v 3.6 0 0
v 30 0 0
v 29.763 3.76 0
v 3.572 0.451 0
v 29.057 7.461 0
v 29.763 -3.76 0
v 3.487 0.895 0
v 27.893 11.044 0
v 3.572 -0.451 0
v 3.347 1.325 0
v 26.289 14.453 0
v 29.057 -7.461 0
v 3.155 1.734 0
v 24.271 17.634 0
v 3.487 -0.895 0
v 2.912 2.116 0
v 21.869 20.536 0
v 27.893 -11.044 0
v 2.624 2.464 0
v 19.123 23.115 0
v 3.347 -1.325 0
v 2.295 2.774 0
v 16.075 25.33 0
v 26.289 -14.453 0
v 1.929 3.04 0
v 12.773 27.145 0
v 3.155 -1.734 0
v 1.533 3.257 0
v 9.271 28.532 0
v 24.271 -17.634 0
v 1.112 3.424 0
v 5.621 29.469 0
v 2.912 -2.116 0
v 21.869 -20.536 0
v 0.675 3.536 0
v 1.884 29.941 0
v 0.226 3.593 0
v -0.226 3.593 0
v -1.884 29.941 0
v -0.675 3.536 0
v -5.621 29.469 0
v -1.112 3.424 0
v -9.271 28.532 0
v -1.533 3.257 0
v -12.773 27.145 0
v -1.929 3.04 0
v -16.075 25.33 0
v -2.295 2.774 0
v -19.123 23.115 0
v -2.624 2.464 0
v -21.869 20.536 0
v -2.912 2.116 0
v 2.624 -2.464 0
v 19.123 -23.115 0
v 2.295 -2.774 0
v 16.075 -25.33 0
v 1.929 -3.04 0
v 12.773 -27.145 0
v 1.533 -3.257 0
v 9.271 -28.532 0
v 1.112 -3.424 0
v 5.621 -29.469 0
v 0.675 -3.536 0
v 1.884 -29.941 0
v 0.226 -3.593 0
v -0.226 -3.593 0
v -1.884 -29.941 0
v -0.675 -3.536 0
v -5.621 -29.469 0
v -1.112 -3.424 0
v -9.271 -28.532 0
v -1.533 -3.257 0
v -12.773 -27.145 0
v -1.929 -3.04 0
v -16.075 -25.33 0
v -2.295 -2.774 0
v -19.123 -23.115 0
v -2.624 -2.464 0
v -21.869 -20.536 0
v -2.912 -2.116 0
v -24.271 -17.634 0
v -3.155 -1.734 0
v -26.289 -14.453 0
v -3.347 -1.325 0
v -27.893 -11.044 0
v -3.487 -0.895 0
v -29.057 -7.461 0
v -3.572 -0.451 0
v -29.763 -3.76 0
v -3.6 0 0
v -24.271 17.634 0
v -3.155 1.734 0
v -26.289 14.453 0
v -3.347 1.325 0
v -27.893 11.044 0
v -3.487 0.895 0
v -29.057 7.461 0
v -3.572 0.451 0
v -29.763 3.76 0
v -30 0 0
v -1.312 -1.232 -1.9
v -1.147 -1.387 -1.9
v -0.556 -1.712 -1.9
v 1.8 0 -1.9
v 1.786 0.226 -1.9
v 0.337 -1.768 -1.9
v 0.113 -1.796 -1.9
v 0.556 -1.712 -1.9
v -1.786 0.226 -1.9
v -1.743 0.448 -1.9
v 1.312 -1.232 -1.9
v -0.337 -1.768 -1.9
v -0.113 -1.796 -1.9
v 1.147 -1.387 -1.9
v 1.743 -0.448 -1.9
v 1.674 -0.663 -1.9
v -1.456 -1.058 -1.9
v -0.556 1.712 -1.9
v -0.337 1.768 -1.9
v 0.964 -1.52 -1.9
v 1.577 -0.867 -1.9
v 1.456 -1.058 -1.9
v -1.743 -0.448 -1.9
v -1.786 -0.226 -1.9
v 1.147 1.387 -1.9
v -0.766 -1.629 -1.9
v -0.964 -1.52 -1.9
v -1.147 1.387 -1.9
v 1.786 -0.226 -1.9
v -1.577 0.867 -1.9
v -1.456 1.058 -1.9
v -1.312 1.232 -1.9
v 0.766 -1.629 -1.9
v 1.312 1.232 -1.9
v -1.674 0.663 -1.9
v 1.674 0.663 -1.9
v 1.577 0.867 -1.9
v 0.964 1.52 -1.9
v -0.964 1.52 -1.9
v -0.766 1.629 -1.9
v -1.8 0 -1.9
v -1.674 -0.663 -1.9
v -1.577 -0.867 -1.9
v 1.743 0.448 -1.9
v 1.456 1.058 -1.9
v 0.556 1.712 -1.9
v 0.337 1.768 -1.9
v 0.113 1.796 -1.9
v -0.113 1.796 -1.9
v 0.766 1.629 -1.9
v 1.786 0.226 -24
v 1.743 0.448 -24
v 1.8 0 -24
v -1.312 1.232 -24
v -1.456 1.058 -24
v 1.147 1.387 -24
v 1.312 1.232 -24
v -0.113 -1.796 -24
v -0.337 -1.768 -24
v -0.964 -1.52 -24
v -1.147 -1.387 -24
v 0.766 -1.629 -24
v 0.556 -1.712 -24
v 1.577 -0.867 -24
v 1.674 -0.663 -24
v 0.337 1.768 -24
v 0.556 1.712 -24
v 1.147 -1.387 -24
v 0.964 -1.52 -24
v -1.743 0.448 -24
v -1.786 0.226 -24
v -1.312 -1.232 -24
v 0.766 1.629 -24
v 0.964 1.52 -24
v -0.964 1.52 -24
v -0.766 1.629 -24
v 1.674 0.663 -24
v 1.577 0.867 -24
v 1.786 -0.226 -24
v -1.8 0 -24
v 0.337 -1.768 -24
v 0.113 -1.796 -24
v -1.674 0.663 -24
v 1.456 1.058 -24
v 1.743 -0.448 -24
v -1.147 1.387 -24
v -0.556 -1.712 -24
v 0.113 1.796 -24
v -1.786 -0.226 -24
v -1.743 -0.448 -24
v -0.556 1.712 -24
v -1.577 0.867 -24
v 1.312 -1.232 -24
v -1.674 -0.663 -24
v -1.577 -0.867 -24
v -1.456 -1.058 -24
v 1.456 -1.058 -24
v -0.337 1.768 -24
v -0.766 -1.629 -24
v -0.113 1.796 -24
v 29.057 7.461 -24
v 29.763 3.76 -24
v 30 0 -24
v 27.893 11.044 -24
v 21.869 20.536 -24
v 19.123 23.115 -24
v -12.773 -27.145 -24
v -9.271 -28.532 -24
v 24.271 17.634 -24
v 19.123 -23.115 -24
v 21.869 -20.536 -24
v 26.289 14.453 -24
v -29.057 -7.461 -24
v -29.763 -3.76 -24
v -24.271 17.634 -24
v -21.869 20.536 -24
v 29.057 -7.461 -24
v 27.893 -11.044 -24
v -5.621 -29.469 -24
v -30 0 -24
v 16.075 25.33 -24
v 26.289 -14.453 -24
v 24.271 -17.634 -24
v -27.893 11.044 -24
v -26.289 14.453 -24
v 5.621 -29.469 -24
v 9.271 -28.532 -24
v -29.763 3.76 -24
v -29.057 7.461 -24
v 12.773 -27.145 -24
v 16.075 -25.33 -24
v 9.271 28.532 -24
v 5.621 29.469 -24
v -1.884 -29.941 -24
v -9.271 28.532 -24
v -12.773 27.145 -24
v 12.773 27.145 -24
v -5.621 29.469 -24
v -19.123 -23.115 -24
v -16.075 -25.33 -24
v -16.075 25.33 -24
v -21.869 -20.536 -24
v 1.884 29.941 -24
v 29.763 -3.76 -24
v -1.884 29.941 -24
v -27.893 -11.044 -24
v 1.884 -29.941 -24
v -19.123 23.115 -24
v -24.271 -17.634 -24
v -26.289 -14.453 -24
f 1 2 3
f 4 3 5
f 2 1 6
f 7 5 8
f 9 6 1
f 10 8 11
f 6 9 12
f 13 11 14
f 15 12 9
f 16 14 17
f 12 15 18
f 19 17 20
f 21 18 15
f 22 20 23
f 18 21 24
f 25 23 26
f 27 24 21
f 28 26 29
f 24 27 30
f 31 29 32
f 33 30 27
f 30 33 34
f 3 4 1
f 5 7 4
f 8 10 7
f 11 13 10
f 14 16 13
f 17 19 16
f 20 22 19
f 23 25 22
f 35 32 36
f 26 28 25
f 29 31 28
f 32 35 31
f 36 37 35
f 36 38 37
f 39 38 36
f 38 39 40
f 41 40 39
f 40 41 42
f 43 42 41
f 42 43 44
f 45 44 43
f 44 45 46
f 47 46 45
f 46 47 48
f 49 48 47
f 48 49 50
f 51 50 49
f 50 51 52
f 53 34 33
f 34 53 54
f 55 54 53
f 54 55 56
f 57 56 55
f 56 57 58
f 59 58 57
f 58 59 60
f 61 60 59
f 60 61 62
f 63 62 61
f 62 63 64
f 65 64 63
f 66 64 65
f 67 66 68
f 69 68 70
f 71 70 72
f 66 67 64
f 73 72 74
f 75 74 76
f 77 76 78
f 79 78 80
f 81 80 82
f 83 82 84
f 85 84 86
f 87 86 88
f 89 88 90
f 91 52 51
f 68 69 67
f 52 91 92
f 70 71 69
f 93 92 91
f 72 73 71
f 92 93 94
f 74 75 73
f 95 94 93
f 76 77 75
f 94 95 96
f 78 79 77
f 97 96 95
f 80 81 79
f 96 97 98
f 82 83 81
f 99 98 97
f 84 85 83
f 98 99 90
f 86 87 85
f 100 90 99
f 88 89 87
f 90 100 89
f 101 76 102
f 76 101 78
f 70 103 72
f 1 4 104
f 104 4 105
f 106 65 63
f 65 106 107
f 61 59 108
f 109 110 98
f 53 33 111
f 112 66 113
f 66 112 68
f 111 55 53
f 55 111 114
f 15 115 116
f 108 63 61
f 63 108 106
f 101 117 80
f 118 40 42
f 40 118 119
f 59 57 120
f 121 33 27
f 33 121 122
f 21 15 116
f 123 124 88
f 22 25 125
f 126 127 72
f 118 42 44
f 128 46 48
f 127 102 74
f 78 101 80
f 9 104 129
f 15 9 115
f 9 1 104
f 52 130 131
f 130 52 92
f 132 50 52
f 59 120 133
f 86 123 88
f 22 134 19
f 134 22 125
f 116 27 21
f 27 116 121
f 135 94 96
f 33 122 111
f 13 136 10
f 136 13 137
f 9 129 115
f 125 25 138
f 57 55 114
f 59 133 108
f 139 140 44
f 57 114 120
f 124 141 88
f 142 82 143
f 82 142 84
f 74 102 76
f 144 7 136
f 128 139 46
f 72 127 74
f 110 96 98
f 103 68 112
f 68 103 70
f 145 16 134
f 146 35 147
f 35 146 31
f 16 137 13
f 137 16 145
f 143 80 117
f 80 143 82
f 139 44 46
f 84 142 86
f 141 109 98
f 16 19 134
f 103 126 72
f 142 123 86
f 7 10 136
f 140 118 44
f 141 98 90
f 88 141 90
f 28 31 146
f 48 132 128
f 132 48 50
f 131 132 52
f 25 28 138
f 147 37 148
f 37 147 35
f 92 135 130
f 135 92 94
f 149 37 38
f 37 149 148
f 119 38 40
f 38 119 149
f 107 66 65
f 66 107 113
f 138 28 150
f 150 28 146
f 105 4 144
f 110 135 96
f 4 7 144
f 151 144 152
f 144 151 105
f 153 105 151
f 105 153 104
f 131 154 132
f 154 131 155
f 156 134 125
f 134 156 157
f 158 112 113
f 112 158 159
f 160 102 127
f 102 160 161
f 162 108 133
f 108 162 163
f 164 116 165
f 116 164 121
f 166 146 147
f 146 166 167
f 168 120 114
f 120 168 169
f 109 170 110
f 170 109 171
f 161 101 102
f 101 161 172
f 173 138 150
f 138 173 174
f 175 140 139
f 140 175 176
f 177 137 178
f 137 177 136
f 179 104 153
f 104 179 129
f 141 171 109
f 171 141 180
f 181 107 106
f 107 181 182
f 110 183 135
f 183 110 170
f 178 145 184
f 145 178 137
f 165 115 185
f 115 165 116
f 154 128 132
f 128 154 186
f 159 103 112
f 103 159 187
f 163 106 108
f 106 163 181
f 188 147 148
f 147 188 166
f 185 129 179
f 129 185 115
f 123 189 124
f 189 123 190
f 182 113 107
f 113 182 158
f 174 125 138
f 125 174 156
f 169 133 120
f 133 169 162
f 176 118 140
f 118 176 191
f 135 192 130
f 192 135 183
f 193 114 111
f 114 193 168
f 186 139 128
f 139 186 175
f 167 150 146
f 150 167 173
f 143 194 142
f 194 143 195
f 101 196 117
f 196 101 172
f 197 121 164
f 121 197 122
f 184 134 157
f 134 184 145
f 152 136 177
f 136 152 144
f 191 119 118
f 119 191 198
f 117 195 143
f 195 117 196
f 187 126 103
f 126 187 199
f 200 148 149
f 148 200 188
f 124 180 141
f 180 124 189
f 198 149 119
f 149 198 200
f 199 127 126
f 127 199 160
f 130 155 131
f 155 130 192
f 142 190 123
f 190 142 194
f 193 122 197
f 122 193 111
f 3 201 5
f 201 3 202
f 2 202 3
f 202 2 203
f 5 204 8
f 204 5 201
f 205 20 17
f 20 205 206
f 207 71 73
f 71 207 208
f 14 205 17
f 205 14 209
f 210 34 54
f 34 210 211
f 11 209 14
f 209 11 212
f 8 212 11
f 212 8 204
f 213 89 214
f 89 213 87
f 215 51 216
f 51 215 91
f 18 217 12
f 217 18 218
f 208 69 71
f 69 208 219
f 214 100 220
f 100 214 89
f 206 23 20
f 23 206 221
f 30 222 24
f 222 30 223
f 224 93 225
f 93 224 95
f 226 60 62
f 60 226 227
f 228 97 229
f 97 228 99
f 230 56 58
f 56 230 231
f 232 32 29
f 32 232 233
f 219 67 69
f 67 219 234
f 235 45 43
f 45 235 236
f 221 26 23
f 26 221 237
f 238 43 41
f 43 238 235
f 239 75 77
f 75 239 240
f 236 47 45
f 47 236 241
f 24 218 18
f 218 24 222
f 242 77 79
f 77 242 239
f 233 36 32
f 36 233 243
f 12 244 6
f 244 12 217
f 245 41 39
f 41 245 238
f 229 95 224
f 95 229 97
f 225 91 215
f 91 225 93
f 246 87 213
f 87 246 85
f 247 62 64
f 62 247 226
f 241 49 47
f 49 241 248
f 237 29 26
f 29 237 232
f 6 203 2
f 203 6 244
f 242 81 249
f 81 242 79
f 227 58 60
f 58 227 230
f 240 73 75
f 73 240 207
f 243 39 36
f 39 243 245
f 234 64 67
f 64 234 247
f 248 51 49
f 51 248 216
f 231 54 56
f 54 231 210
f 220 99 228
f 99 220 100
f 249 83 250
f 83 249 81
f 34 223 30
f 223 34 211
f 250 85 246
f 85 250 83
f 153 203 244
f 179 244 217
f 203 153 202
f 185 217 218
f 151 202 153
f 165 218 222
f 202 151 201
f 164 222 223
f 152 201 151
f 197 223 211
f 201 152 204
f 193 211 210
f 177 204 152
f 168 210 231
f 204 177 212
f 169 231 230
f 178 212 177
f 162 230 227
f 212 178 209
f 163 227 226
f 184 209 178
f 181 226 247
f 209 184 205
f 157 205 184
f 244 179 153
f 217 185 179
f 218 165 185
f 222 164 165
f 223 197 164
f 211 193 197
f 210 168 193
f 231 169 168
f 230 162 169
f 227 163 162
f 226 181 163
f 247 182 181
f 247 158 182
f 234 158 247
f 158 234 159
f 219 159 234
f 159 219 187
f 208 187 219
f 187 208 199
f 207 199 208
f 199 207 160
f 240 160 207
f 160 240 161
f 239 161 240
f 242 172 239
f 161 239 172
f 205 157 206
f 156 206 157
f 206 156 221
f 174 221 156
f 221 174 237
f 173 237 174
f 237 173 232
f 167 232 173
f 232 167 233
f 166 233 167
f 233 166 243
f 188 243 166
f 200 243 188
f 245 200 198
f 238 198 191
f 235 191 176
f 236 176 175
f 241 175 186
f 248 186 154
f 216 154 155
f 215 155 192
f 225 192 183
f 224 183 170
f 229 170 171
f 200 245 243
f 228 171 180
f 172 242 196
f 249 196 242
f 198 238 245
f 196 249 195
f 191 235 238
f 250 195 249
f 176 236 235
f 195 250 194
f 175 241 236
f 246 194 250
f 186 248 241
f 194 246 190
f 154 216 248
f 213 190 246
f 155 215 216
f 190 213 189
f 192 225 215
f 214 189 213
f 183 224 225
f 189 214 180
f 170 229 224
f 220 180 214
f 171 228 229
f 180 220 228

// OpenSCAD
$fn = 50;


difference() {
	union() {
		translate(v = [0, 0, -24.0000000000]) {
			cylinder(h = 24, r = 30.0000000000);
		}
	}
	union() {
		translate(v = [0, 0, 0]) {
			rotate(a = [0, 0, 0]) {
				difference() {
					union() {
						translate(v = [0, 0, -27.0000000000]) {
							cylinder(h = 27, r = 1.5000000000);
						}
						translate(v = [0, 0, -1.9000000000]) {
							cylinder(h = 1.9000000000, r1 = 1.8000000000, r2 = 3.6000000000);
						}
						translate(v = [0, 0, -27.0000000000]) {
							cylinder(h = 27, r = 1.8000000000);
						}
						translate(v = [0, 0, -27.0000000000]) {
							cylinder(h = 27, r = 1.5000000000);
						}
					}
					union();
				}
			}
		}
	}
}
